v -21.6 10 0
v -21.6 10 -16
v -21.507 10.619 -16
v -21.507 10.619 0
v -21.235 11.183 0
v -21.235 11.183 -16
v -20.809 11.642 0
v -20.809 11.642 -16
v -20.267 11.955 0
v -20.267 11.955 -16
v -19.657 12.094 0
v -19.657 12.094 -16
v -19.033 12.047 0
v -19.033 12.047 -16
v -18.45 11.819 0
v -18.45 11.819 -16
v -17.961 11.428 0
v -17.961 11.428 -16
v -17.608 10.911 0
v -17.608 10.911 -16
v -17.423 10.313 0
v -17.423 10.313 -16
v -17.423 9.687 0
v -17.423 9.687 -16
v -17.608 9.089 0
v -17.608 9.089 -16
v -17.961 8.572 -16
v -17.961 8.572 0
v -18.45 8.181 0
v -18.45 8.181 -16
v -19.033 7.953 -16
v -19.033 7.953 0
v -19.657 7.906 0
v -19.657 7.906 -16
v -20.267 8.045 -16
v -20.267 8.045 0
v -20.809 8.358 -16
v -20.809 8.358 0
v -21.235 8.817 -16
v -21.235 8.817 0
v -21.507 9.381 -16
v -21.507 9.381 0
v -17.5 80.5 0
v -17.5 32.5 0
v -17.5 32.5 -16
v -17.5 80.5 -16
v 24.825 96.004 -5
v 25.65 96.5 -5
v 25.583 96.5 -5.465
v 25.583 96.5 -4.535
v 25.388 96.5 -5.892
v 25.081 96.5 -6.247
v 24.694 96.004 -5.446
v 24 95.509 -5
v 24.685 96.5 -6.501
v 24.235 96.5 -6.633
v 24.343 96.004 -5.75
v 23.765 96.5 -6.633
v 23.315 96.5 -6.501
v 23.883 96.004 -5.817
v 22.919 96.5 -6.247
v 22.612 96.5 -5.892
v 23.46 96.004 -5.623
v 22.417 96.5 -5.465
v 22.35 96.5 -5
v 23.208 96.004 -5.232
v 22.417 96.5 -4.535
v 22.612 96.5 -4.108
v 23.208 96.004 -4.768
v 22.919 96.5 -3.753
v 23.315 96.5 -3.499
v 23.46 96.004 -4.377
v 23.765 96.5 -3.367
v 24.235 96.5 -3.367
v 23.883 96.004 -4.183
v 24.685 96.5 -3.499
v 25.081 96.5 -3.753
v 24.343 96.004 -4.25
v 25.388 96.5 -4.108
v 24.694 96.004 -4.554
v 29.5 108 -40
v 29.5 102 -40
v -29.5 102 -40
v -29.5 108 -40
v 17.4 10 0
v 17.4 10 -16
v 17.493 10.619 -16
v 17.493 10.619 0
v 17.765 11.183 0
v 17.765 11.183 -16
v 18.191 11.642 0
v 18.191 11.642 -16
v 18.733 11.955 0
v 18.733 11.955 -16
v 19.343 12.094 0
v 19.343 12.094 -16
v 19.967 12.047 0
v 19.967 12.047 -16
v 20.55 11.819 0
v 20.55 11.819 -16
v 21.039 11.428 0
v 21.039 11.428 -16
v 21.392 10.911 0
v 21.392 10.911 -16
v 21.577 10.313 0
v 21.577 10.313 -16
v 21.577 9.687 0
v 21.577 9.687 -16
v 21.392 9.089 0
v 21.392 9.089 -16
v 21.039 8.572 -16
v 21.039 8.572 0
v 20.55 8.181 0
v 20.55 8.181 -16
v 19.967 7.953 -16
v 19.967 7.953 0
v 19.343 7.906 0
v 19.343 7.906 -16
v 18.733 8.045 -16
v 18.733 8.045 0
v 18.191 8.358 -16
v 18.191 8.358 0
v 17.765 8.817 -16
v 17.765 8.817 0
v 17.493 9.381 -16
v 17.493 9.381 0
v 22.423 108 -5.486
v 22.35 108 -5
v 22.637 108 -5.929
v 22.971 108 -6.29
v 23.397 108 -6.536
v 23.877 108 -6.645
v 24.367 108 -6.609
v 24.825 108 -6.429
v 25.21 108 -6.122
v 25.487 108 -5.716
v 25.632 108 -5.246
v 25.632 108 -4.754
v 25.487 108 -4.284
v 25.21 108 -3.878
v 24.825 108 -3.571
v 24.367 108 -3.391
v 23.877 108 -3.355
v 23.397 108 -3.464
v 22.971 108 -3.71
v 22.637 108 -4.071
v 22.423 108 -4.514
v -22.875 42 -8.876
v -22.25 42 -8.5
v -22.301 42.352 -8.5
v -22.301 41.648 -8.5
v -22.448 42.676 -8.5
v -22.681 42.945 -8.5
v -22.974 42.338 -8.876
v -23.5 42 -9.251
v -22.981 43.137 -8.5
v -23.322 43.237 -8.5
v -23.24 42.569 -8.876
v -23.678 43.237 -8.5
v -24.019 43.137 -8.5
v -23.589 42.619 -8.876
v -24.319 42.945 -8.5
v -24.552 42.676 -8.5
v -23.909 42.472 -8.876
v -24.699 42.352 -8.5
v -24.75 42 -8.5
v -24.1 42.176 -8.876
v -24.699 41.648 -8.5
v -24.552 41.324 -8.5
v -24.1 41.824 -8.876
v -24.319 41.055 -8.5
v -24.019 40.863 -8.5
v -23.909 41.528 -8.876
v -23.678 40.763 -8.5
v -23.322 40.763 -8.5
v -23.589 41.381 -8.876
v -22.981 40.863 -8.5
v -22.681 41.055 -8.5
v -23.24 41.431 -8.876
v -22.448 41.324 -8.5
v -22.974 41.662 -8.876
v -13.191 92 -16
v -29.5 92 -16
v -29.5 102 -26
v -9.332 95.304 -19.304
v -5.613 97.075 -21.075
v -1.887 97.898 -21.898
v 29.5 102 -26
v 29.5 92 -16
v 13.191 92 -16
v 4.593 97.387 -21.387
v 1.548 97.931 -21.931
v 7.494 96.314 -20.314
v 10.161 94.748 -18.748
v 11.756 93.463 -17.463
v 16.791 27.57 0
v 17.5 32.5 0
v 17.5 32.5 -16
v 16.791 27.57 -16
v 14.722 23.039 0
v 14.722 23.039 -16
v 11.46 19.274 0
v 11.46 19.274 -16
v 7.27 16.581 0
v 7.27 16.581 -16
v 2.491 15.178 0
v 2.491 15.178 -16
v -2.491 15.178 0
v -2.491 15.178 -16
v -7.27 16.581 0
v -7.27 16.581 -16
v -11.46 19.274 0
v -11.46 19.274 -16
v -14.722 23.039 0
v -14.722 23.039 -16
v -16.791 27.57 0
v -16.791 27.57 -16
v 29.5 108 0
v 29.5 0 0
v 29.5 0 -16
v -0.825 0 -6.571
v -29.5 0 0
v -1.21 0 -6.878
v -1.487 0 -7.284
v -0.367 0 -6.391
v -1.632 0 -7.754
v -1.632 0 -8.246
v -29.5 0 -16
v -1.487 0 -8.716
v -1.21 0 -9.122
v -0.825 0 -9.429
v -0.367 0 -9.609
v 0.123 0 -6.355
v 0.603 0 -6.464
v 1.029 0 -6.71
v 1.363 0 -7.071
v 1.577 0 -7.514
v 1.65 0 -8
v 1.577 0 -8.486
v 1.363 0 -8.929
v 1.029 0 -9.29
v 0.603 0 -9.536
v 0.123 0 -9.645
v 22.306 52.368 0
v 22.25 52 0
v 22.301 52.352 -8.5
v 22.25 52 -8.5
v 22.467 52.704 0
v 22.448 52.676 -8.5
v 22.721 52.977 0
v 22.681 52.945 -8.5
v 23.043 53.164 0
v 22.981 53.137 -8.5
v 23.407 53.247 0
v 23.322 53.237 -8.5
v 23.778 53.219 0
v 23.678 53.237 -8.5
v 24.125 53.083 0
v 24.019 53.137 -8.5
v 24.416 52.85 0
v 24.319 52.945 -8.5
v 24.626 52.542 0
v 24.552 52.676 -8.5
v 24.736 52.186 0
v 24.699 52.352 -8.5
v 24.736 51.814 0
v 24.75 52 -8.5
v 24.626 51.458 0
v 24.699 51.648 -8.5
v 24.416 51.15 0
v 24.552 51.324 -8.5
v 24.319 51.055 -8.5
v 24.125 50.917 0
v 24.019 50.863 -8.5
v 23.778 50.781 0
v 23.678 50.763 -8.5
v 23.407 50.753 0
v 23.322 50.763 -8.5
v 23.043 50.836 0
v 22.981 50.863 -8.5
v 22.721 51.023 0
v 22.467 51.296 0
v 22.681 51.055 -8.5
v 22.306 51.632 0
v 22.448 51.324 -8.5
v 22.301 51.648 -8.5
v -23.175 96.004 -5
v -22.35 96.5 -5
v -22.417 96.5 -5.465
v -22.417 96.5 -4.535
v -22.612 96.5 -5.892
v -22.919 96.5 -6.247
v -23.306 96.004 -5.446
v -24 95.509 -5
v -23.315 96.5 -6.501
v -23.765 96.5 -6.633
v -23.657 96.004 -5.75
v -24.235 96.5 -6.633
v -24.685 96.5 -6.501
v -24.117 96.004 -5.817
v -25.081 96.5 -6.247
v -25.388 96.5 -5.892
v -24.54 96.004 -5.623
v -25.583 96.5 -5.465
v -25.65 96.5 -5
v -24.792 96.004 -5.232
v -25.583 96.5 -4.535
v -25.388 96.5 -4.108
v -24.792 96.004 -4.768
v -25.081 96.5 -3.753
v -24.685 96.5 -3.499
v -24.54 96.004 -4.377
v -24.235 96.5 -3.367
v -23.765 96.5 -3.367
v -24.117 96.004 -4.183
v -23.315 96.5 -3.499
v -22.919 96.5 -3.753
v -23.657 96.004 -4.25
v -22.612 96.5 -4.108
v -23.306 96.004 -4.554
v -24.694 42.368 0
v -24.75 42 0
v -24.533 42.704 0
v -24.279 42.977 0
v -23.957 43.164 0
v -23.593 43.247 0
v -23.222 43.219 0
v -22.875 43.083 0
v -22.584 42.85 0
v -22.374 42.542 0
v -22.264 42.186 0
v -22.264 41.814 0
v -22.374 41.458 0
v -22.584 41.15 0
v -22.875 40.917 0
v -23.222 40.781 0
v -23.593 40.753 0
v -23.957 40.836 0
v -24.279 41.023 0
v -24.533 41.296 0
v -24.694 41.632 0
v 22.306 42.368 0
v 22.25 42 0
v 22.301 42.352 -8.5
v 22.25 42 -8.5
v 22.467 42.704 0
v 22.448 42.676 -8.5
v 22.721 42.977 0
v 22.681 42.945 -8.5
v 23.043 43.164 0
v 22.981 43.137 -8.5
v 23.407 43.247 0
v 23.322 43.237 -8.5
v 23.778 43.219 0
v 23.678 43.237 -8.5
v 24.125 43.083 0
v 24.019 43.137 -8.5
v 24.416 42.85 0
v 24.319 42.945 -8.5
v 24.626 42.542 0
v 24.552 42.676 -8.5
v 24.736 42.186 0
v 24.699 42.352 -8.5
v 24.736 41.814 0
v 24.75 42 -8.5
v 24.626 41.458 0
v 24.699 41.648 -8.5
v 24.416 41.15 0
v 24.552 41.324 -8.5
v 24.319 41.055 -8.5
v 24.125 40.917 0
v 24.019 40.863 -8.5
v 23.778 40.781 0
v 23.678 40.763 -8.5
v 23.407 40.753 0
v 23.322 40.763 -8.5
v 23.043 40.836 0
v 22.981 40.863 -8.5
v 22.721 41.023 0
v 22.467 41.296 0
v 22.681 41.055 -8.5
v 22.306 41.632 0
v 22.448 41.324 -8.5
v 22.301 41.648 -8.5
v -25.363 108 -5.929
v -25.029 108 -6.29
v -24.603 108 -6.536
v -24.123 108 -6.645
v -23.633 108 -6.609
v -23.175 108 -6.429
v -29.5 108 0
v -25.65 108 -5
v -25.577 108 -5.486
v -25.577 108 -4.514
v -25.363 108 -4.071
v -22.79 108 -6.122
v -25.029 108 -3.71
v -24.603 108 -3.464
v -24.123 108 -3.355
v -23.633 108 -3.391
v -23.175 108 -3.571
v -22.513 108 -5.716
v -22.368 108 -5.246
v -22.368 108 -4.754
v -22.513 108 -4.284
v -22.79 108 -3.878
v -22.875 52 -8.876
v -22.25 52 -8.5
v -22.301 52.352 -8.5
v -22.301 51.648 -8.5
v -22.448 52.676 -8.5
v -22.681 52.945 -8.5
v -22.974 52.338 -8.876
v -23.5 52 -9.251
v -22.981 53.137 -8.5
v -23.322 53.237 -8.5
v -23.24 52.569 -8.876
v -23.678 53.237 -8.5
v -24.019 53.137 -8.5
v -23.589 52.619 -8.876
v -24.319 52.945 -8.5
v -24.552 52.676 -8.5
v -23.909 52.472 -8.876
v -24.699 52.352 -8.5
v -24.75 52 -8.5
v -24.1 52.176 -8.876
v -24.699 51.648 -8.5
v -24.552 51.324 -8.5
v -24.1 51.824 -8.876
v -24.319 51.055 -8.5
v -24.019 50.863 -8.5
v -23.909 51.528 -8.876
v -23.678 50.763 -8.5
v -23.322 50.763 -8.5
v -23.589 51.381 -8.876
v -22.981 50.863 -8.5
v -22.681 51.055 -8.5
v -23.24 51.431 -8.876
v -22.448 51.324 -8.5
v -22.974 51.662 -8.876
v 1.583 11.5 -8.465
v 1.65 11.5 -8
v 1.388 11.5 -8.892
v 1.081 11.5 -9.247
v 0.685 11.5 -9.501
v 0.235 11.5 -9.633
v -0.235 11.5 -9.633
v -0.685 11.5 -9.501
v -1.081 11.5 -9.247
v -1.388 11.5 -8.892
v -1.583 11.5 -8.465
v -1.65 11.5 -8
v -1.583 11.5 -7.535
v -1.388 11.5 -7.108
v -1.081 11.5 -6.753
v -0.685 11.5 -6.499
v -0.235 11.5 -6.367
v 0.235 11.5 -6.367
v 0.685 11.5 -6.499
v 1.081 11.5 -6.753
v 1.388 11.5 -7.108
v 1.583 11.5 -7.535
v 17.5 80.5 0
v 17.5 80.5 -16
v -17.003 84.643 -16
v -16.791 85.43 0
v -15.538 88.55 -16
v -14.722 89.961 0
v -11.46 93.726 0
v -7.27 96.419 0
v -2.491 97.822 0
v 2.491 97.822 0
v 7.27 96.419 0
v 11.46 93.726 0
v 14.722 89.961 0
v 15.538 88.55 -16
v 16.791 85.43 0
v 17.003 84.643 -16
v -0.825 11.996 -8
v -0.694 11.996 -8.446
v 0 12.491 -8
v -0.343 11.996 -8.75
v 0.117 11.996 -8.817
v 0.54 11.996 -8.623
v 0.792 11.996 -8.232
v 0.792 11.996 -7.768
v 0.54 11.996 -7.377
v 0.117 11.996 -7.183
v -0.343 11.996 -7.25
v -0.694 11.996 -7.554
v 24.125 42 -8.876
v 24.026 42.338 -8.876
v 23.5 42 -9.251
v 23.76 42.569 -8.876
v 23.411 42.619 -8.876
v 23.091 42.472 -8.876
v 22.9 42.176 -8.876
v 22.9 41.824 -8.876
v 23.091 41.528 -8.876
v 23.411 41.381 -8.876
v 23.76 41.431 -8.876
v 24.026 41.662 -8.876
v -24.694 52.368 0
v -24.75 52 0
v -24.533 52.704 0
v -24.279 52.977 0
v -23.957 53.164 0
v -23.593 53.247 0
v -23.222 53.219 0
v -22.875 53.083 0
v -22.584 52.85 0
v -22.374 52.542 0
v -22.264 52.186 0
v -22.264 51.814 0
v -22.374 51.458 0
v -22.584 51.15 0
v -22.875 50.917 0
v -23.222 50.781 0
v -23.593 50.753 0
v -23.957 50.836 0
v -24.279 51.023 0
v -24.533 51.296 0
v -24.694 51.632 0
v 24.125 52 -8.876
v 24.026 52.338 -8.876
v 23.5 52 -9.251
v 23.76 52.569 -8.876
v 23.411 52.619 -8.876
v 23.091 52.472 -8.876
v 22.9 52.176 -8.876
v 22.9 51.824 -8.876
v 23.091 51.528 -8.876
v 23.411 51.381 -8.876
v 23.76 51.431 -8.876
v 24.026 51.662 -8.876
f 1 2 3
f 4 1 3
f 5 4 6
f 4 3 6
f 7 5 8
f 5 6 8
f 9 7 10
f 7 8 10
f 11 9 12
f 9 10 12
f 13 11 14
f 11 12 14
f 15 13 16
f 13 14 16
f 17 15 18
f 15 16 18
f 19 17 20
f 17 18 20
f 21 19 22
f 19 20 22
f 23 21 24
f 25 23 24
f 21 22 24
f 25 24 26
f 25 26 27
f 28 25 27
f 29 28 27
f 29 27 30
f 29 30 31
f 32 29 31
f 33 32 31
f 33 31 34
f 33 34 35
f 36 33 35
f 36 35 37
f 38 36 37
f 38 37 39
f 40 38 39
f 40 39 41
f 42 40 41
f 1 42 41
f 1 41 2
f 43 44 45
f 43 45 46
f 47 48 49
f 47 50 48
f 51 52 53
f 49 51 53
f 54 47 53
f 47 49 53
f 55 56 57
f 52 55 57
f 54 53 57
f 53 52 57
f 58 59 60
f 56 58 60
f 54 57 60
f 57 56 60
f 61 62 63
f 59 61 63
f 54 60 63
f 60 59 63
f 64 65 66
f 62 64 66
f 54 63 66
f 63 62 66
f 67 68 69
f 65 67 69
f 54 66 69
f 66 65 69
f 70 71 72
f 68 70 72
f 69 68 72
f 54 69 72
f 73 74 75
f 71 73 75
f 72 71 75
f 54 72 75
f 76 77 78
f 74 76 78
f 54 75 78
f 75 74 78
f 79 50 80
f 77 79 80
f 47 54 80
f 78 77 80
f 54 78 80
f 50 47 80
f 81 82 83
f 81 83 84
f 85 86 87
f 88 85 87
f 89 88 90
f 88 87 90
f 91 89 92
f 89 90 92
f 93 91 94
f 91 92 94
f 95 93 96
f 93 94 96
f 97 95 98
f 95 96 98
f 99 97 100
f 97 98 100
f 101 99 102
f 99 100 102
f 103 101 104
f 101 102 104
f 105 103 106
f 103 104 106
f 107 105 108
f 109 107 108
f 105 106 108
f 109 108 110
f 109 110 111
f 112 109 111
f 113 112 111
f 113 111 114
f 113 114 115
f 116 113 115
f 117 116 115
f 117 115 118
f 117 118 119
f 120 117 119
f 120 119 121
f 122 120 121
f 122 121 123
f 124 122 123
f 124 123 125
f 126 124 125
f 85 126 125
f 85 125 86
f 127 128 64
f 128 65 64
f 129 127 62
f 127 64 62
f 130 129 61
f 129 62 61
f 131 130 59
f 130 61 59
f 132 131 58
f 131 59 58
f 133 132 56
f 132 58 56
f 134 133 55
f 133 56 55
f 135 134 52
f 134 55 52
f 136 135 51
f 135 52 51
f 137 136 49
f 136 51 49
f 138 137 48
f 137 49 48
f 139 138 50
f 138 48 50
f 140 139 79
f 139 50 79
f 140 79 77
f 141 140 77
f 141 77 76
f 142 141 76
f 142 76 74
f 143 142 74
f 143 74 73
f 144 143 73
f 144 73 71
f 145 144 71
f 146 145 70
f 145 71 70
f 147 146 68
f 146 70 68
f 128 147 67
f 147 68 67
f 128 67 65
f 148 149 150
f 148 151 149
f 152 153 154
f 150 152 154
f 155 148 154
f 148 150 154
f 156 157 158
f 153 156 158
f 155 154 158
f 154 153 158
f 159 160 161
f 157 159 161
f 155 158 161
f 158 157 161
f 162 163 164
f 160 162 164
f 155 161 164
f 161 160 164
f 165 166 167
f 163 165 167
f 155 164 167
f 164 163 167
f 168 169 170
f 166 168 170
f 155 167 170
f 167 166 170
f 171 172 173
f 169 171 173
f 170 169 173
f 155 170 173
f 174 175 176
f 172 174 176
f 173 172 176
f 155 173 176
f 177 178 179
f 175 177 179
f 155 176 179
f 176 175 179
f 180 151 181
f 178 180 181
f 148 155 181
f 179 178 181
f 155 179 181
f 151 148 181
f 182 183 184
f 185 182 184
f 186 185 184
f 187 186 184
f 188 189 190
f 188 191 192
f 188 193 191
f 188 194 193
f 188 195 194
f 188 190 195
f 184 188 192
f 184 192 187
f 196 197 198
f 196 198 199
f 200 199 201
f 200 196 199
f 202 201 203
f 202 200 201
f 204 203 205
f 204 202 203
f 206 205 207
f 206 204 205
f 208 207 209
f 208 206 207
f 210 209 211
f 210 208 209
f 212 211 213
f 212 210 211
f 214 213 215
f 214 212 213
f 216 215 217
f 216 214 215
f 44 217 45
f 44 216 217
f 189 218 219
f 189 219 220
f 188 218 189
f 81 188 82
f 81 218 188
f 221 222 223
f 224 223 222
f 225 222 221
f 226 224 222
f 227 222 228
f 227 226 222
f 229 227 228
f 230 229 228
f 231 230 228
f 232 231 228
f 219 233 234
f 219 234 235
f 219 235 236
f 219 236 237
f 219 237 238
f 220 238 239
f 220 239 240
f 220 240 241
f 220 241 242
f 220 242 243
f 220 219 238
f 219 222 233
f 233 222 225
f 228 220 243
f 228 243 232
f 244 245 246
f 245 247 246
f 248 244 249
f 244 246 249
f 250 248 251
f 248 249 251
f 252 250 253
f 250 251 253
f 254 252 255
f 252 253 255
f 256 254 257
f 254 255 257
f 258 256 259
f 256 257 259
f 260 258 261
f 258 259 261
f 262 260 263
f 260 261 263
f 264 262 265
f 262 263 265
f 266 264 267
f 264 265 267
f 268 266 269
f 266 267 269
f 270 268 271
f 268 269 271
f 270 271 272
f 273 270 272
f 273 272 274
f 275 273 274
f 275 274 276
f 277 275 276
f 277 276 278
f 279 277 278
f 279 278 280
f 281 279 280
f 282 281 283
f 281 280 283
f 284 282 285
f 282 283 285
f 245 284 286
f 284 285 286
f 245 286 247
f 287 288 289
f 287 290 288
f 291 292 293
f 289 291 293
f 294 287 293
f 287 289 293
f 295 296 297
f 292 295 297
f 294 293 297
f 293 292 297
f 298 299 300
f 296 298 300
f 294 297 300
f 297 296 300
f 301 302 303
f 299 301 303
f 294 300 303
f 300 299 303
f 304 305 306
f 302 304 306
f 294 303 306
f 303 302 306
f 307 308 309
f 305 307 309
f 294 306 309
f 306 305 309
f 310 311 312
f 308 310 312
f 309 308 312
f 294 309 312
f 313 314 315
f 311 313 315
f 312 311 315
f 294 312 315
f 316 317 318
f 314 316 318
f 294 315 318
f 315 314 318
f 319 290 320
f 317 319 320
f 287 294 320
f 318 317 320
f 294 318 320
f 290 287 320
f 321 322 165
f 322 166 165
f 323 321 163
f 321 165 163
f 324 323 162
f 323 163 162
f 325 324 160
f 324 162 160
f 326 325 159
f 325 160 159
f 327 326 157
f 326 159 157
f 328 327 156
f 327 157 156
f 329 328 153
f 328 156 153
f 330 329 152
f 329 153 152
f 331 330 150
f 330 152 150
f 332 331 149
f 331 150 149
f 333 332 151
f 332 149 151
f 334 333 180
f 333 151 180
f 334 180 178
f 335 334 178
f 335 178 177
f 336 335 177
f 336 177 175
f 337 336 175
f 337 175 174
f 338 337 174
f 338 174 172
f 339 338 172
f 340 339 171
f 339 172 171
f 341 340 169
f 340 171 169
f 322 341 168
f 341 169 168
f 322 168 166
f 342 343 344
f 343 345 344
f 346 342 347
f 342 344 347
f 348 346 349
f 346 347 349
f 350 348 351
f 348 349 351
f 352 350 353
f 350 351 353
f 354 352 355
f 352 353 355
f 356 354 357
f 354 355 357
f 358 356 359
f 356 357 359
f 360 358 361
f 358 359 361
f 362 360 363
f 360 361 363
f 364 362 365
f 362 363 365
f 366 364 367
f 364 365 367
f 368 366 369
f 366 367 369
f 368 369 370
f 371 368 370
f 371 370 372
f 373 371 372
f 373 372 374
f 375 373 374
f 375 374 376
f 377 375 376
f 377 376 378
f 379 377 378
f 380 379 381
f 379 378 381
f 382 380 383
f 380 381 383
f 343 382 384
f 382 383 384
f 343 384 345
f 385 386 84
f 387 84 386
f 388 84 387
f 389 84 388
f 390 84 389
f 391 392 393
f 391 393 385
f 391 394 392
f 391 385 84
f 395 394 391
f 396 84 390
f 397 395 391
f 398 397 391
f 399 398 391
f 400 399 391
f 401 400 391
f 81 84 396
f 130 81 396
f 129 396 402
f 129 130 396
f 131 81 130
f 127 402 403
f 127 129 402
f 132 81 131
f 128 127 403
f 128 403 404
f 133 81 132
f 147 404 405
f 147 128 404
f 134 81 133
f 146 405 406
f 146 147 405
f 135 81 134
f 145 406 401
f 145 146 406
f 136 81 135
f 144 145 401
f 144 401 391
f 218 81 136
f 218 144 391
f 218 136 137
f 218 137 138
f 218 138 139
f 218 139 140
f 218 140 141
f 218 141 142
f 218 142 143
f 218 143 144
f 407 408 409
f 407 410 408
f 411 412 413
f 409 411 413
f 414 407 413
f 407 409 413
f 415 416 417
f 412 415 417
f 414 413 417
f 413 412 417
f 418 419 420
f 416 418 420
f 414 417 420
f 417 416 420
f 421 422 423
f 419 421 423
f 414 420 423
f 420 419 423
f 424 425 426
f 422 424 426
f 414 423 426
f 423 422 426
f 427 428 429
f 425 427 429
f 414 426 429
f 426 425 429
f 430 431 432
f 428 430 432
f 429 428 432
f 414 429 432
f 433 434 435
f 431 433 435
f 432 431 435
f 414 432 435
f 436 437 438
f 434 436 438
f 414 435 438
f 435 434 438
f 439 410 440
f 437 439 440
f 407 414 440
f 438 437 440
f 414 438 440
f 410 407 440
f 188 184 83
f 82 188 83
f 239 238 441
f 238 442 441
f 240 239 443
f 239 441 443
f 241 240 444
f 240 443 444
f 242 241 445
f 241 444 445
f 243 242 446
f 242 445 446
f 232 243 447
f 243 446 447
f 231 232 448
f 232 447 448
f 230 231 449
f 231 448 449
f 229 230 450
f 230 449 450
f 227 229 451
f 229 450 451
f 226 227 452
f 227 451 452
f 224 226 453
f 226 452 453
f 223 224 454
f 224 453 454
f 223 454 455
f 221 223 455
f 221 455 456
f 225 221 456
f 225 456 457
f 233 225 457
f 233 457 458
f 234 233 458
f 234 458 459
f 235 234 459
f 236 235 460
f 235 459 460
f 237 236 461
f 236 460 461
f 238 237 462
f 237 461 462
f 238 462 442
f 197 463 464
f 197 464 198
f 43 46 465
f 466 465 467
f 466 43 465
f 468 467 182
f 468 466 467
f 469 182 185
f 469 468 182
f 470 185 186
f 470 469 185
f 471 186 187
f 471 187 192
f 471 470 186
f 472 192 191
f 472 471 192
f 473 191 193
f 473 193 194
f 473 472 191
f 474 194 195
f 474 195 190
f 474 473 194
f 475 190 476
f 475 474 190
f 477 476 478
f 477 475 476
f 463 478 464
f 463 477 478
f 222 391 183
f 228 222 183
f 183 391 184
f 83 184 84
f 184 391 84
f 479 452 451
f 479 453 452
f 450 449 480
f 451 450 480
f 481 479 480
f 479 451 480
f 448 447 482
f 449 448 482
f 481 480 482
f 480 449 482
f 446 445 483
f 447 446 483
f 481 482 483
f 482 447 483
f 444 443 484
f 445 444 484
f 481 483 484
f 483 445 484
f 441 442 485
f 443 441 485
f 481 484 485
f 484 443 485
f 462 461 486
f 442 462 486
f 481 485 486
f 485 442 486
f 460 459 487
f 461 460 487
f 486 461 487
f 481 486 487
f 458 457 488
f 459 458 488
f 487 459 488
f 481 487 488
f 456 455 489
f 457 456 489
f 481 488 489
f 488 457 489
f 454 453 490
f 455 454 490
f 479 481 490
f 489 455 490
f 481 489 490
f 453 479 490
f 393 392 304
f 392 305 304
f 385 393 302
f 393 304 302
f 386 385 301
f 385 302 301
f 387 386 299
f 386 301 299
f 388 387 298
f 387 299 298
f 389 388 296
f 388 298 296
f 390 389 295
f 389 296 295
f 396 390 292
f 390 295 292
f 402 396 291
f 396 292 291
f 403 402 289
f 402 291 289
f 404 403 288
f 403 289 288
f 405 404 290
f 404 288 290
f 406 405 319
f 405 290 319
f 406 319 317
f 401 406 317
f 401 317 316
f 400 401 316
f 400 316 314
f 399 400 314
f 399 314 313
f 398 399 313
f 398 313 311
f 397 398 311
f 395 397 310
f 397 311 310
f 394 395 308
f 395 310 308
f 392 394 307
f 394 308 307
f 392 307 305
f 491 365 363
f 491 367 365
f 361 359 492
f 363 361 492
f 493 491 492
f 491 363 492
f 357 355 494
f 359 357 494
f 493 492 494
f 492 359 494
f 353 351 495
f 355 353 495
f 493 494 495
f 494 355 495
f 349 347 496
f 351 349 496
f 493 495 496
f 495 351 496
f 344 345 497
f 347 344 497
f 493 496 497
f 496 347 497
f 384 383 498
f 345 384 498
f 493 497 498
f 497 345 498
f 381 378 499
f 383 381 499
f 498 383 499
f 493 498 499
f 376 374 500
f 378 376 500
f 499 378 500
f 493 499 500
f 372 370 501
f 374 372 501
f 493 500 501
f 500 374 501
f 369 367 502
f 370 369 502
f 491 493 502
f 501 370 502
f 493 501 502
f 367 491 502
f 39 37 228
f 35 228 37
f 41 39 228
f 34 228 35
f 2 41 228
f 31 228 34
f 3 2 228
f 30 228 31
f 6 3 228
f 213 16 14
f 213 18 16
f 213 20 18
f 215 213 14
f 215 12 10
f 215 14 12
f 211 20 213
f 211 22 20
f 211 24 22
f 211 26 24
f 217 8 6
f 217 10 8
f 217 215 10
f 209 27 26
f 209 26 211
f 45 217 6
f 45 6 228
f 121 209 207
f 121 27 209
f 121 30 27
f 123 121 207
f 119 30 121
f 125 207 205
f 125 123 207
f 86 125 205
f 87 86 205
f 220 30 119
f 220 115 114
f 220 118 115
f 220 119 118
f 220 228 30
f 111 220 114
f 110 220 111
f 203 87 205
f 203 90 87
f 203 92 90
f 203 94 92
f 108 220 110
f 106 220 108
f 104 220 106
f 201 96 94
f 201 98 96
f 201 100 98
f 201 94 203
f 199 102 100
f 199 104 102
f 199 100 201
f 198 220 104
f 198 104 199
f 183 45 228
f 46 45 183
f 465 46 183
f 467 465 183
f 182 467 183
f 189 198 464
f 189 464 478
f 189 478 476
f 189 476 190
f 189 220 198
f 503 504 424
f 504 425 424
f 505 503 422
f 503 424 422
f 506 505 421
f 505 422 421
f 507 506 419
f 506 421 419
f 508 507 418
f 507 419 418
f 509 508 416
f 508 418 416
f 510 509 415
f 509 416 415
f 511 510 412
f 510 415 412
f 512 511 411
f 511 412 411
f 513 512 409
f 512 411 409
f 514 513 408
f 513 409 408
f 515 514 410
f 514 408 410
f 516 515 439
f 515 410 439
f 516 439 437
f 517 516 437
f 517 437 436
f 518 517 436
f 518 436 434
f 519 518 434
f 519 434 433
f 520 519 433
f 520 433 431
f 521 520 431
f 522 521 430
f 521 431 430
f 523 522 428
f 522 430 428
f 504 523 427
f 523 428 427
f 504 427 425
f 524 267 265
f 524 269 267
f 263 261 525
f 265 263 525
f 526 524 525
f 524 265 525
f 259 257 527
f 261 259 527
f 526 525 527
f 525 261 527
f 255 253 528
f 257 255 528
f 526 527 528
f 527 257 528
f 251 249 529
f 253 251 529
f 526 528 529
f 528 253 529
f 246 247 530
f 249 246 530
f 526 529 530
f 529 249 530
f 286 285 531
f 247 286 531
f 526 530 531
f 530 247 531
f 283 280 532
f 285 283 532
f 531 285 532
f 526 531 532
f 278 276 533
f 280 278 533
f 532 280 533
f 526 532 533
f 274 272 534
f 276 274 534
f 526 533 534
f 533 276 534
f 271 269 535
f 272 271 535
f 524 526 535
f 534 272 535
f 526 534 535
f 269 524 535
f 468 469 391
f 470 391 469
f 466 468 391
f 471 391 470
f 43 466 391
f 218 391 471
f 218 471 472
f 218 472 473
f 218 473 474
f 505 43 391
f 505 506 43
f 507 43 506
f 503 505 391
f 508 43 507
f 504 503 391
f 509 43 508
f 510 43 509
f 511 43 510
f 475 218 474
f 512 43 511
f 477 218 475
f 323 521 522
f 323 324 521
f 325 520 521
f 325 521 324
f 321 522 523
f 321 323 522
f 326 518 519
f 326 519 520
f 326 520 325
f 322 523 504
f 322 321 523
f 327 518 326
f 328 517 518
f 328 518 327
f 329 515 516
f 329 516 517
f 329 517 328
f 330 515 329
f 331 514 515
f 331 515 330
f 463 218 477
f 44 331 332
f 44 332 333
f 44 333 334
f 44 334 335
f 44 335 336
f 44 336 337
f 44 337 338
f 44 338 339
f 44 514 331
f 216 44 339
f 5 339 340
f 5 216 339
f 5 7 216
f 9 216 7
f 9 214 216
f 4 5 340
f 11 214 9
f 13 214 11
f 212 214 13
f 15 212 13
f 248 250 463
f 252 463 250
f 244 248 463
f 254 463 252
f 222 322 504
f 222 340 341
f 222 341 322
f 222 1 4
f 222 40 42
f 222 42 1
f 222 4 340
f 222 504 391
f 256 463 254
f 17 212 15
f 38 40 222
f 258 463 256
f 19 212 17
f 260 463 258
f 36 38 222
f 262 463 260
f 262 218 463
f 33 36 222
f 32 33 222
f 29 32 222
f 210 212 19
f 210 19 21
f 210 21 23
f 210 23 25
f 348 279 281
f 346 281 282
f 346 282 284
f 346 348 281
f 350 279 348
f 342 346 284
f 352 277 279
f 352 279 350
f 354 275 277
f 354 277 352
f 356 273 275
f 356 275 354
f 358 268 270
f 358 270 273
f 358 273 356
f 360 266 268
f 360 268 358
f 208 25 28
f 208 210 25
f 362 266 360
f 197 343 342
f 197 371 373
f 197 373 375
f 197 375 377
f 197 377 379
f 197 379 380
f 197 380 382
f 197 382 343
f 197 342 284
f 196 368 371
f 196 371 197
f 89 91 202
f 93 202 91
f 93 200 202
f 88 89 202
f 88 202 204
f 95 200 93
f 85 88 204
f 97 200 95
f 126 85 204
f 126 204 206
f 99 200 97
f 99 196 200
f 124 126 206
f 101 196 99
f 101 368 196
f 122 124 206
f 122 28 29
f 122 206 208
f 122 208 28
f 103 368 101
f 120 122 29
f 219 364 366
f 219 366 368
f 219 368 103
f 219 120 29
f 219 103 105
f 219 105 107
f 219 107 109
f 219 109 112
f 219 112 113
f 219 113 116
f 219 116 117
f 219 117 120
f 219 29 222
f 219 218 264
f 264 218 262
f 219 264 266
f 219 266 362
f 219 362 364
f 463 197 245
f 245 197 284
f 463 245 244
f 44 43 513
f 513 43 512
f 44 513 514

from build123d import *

# Parameters (mm, degrees)
EXTRUDE_2_DEPTH        = 29.5
HOLE_WIZARD_M4_2_D     = 3.3
HOLE_WIZARD_M4_2_DEPTH = 11.5
HOLE_WIZARD_M4_2_TIP   = 0.991420021
CUT_EXTRUDE_1_DEPTH    = 119.887551914
HOLE_WIZARD_M5_1_D     = 4.2
HOLE_WIZARD_M3_1_D     = 2.5
HOLE_WIZARD_M3_1_DEPTH = 8.5
HOLE_WIZARD_M3_1_TIP   = 0.751075774
HOLE_WIZARD_M4_3_D     = 3.3
HOLE_WIZARD_M4_3_DEPTH = 11.5
HOLE_WIZARD_M4_3_TIP   = 0.991420021


with BuildPart() as part:
    # 草图5 → 凸台-拉伸2 (new, symmetric)
    with BuildSketch(Plane(origin=(0, 0, 0), x_dir=(0, 0, -1), z_dir=(1, 0, 0))):
        Polygon((26, 102), (40, 102), (40, 108), (0, 108), (0, 0), (16, 0), (16, 92), align=None)
    extrude(amount=EXTRUDE_2_DEPTH, both=True)

    # M4 螺纹孔2
    with Locations(Plane(origin=(0, 108, 0), x_dir=(1, 0, 0), z_dir=(0, 1, 0))):
        with Locations((24, 5), (-24, 5)):
            Hole(HOLE_WIZARD_M4_2_D / 2, depth=HOLE_WIZARD_M4_2_DEPTH)
            with Locations((0, 0, -(HOLE_WIZARD_M4_2_DEPTH + HOLE_WIZARD_M4_2_TIP / 2))):  # 118° drill point
                Cone(0, HOLE_WIZARD_M4_2_D / 2, HOLE_WIZARD_M4_2_TIP, mode=Mode.SUBTRACT)

    # 草图8 → 切除-拉伸1 (cut, through all)
    with BuildSketch(Plane.XY):
        with BuildLine():
            Line((17.5, 80.5), (17.5, 32.5))
            ThreePointArc((17.5, 32.5), (0, 15), (-17.5, 32.5))
            Line((-17.5, 32.5), (-17.5, 80.5))
            ThreePointArc((-17.5, 80.5), (0, 98), (17.5, 80.5))
        make_face()
    extrude(amount=-CUT_EXTRUDE_1_DEPTH, mode=Mode.SUBTRACT)

    # M5 螺纹孔1 (through all)
    with Locations(Plane.XY):
        with Locations((-19.5, 10), (19.5, 10)):
            Hole(HOLE_WIZARD_M5_1_D / 2)

    # M3 螺纹孔1
    with Locations(Plane.XY):
        with Locations((23.5, 42), (-23.5, 52), (-23.5, 42), (23.5, 52)):
            Hole(HOLE_WIZARD_M3_1_D / 2, depth=HOLE_WIZARD_M3_1_DEPTH)
            with Locations((0, 0, -(HOLE_WIZARD_M3_1_DEPTH + HOLE_WIZARD_M3_1_TIP / 2))):  # 118° drill point
                Cone(0, HOLE_WIZARD_M3_1_D / 2, HOLE_WIZARD_M3_1_TIP, mode=Mode.SUBTRACT)

    # M4 螺纹孔3
    with Locations(Plane(origin=(0, 0, 0), x_dir=(-1, 0, 0), z_dir=(0, -1, 0))):
        with Locations((0, 8)):
            Hole(HOLE_WIZARD_M4_3_D / 2, depth=HOLE_WIZARD_M4_3_DEPTH)
            with Locations((0, 0, -(HOLE_WIZARD_M4_3_DEPTH + HOLE_WIZARD_M4_3_TIP / 2))):  # 118° drill point
                Cone(0, HOLE_WIZARD_M4_3_D / 2, HOLE_WIZARD_M4_3_TIP, mode=Mode.SUBTRACT)


solid = part.part
